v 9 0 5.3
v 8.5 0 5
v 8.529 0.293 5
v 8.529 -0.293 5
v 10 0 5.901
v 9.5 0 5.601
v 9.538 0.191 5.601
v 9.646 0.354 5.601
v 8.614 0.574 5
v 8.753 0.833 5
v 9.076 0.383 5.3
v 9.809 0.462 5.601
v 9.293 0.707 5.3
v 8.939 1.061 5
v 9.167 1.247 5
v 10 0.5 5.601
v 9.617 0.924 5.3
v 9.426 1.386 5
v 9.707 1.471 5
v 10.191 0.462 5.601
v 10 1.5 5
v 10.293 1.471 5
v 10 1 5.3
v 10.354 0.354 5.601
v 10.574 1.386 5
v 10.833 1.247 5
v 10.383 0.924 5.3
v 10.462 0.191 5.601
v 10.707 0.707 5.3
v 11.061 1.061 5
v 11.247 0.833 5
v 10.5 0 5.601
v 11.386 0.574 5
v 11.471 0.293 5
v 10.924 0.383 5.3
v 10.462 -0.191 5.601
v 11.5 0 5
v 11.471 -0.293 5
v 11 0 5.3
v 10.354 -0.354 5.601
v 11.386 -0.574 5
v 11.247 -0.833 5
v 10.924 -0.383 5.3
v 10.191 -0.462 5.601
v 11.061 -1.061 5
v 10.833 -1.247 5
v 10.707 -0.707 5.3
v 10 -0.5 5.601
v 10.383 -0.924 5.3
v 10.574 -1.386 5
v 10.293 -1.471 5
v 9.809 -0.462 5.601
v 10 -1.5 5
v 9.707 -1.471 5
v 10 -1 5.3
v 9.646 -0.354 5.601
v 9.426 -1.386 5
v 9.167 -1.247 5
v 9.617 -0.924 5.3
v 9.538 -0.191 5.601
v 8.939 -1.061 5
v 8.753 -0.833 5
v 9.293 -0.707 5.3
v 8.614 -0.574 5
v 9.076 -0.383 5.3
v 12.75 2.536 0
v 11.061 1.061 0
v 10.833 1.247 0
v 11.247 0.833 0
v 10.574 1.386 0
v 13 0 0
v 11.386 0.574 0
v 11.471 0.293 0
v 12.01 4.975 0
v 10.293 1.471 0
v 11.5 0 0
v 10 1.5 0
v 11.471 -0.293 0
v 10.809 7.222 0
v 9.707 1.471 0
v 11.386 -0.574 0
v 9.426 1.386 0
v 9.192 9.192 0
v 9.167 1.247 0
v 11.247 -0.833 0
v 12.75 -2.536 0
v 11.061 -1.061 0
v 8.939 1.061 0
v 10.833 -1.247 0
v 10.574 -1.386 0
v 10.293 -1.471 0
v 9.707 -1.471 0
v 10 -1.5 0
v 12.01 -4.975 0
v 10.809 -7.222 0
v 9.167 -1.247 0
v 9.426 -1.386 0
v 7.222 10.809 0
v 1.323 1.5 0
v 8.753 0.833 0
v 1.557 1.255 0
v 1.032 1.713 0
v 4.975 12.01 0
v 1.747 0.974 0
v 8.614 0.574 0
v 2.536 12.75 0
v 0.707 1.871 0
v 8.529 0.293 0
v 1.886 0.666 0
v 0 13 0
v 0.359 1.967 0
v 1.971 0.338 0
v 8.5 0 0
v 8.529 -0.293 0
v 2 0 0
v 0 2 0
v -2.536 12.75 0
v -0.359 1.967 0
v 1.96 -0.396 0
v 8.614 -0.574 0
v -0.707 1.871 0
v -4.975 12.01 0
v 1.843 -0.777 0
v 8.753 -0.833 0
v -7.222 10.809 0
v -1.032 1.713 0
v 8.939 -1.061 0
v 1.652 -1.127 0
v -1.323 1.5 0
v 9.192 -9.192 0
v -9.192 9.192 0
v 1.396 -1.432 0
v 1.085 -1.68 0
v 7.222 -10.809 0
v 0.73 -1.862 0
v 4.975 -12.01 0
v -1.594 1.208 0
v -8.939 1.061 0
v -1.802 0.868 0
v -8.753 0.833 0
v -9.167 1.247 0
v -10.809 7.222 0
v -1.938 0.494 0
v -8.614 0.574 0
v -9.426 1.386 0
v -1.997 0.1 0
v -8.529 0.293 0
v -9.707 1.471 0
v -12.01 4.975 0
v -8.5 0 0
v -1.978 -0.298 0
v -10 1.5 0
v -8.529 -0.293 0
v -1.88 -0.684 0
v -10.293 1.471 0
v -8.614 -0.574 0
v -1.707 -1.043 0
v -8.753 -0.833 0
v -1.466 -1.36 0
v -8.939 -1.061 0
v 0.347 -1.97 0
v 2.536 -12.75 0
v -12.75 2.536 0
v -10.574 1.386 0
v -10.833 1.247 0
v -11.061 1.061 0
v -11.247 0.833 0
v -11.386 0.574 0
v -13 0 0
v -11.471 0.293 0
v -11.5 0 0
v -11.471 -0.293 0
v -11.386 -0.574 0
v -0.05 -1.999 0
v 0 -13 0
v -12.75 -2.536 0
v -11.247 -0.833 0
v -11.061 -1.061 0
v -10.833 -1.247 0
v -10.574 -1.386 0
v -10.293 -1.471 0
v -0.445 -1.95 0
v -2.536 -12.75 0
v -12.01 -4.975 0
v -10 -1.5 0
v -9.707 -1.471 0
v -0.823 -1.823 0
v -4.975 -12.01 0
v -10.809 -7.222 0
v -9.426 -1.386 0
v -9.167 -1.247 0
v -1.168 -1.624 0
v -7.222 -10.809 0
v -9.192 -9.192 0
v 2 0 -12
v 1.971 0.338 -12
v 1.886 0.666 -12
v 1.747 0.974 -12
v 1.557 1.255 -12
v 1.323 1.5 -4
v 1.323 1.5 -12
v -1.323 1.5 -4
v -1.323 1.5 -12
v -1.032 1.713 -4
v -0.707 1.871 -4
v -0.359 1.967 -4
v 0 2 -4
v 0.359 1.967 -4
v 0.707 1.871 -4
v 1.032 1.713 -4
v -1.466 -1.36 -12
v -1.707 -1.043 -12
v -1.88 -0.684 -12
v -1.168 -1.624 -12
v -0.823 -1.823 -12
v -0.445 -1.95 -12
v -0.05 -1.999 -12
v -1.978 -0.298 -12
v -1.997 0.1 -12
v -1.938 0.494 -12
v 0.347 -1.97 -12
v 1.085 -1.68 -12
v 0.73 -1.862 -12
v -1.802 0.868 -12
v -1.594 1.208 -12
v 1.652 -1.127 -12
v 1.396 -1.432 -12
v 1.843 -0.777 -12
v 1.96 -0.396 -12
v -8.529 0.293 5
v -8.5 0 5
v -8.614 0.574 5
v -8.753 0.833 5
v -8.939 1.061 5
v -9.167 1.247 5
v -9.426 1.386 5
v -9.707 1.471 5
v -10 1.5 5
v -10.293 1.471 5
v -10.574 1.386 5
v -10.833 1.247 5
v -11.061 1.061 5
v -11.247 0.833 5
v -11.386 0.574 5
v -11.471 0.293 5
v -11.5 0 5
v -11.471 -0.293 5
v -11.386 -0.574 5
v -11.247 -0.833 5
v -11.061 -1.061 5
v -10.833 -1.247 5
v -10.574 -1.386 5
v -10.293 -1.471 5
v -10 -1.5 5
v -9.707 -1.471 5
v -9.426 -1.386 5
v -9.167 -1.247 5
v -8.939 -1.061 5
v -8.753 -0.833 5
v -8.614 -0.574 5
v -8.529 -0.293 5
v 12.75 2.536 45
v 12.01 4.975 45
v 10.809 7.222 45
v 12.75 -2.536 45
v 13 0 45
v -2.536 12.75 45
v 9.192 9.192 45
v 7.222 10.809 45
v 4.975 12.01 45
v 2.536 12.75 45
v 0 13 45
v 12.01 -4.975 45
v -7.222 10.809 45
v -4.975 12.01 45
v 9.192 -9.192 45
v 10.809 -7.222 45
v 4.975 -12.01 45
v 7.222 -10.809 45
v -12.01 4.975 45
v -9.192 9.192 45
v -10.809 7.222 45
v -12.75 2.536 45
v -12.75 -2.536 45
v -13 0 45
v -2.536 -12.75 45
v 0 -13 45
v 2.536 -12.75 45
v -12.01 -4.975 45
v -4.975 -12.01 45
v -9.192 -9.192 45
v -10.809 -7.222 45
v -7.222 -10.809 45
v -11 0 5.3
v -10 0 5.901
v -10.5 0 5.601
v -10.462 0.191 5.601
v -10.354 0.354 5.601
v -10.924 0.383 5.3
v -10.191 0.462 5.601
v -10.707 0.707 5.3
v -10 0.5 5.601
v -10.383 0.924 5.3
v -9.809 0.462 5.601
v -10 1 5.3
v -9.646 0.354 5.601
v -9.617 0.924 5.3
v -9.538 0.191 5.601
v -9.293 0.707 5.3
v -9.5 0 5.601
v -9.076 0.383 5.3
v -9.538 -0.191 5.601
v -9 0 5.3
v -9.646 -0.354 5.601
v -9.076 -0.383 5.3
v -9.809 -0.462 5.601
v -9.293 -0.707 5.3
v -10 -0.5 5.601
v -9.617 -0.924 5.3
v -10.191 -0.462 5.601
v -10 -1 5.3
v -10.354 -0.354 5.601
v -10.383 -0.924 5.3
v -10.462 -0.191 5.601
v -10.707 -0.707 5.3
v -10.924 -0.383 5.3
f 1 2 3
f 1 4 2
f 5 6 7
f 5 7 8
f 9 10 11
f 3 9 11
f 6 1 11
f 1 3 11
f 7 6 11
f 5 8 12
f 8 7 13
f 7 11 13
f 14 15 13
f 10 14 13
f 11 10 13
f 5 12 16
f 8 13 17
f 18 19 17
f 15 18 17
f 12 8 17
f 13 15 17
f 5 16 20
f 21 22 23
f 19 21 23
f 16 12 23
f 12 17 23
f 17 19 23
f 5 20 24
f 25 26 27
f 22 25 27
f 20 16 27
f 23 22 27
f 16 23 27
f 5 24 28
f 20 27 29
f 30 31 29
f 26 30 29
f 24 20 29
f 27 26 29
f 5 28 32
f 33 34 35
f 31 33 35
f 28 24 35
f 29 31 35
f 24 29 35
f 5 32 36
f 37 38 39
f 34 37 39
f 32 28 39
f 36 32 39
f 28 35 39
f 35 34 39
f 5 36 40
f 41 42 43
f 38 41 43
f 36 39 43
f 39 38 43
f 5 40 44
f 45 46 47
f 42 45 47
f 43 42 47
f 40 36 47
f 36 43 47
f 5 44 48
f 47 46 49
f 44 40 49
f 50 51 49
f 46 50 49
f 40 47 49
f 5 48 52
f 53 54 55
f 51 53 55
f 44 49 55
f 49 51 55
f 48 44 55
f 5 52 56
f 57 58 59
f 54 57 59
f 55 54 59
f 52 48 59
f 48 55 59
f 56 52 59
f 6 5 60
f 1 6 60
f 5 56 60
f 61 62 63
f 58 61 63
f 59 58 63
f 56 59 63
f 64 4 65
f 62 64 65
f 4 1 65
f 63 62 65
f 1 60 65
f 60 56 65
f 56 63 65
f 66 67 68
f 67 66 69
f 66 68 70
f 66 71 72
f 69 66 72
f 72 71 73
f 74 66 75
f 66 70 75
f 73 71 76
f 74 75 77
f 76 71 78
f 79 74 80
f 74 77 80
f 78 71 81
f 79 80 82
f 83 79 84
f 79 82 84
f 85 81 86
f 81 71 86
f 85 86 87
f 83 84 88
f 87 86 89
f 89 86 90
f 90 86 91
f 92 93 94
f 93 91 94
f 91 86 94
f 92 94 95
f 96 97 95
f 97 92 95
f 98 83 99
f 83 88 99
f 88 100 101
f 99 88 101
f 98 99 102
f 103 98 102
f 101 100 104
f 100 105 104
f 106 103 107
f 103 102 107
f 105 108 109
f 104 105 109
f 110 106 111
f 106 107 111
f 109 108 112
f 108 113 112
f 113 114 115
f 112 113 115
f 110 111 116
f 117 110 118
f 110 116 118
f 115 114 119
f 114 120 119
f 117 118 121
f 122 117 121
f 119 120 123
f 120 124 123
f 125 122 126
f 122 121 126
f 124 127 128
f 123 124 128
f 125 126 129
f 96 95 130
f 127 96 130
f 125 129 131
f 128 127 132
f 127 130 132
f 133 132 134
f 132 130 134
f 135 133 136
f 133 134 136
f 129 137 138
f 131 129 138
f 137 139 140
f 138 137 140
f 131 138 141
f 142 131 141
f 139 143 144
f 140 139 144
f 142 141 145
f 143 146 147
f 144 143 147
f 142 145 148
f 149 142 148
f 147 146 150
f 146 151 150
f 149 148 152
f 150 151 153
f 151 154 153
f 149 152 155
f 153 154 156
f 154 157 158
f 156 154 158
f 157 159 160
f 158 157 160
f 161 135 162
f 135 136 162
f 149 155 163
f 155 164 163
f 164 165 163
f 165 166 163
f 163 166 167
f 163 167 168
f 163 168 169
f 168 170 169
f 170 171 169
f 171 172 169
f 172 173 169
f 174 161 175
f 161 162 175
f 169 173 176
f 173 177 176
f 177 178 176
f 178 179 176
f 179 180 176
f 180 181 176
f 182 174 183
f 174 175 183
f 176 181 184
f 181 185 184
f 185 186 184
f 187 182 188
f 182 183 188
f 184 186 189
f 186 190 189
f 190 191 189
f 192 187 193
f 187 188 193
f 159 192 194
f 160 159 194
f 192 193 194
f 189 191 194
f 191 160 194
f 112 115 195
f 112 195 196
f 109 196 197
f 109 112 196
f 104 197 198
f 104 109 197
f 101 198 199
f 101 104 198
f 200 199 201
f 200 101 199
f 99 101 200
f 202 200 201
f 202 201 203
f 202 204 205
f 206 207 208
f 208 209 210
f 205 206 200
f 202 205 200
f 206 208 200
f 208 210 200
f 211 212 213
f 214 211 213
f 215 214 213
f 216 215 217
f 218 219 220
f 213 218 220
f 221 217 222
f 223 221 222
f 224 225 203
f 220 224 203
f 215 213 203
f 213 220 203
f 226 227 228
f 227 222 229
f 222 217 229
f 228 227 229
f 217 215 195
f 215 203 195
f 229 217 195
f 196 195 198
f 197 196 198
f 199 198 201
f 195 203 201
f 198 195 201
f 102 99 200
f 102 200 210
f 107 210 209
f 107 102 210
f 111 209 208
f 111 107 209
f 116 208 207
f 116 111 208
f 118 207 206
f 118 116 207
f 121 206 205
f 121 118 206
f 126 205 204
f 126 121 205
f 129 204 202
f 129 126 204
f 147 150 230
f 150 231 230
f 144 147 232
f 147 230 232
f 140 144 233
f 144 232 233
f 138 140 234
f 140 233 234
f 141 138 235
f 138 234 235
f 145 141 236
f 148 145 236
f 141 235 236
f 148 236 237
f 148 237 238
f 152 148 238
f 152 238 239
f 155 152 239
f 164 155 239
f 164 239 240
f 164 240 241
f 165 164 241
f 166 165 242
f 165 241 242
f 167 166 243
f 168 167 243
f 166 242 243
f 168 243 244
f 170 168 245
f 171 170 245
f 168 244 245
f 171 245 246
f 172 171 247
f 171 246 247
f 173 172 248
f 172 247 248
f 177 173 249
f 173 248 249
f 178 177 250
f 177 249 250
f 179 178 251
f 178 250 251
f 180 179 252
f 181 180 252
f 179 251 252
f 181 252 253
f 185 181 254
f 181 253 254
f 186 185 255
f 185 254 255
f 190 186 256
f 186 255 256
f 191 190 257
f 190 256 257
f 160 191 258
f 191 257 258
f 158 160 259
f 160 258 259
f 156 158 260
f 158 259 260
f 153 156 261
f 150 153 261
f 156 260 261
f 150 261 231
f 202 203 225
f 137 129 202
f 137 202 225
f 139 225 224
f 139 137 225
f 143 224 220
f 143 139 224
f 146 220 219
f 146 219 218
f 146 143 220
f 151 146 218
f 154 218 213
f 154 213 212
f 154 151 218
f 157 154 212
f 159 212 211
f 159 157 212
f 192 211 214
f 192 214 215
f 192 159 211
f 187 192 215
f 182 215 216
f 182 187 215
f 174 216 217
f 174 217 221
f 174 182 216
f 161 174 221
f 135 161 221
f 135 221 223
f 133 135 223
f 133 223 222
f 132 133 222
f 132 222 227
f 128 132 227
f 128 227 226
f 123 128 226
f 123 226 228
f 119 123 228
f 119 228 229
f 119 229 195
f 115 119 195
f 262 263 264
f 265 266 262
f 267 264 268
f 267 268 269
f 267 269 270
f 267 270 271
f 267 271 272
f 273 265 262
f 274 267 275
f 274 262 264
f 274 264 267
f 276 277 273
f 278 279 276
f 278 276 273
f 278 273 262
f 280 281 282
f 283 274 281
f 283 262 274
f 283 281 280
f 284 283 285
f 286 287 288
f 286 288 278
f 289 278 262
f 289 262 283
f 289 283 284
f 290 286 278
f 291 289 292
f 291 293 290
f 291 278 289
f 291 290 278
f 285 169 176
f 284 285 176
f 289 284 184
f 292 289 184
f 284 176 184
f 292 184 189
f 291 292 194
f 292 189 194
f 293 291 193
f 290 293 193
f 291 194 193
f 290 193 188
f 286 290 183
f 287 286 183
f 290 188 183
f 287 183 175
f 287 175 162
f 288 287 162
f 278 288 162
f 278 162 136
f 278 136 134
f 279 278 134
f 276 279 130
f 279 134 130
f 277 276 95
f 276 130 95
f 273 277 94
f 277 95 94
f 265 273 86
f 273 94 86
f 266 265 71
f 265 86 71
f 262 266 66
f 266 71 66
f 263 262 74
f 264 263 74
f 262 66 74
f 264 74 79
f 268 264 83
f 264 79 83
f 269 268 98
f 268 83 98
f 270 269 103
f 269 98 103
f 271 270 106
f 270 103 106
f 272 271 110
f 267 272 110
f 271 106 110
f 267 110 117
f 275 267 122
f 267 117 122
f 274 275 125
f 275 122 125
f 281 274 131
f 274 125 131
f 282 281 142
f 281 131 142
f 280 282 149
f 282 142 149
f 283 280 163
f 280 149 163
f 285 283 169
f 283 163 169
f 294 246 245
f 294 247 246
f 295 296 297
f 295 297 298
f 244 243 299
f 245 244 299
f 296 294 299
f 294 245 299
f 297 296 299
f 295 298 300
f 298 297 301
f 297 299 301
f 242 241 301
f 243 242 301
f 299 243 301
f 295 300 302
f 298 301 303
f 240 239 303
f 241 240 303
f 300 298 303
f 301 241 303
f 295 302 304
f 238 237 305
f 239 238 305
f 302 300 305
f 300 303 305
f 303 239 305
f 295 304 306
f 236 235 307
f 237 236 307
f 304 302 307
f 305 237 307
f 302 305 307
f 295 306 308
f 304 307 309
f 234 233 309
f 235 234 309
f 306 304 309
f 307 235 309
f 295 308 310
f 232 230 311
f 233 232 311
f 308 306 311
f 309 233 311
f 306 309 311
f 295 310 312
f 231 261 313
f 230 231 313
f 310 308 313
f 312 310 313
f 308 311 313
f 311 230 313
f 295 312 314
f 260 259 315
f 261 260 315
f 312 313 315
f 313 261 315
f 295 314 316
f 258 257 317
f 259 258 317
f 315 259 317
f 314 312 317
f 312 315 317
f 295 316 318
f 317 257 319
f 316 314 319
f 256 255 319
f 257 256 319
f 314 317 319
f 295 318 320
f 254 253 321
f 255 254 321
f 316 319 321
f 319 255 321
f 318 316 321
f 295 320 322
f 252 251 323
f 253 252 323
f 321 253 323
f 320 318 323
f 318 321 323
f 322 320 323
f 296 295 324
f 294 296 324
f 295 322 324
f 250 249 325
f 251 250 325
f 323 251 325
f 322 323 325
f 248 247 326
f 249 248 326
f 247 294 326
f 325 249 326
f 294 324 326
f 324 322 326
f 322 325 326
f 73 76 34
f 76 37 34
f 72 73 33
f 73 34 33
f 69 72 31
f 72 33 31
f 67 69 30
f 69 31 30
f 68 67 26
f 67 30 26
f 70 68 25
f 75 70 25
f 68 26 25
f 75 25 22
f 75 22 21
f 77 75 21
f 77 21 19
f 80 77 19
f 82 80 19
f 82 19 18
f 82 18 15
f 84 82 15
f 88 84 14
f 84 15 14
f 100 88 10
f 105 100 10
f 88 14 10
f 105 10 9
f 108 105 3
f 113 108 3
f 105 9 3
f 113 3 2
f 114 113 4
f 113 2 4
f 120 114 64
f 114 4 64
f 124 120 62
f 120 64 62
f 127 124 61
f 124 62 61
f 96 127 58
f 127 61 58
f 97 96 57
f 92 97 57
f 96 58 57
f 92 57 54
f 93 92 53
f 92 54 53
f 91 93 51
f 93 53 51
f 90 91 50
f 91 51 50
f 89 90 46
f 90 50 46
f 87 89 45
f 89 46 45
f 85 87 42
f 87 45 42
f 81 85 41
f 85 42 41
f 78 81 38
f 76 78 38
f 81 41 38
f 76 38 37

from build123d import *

# Parameters (mm, degrees)
SKETCH1_R                 = 13
MOTOR_BODY_DEPTH          = 45
BOSS_EXTRUDE2_DEPTH       = 12
BOSS_EXTRUDE3_DEPTH       = 4
F_3_0MM_DOWEL_HOLE2_D     = 3
F_3_0MM_DOWEL_HOLE2_DEPTH = 5
F_3_0MM_DOWEL_HOLE2_TIP   = 0.901290929


with BuildPart() as part:
    # Sketch1 → Motor Body (new body)
    with BuildSketch(Plane.XY):
        with Locations(Location((0, 0, 0), (0, 0, 180))):
            Circle(SKETCH1_R)
    extrude(amount=MOTOR_BODY_DEPTH)

    # Sketch2 → Boss-Extrude2 (add)
    with BuildSketch(Plane.XY):
        with BuildLine():
            ThreePointArc((2, 0), (1.822875656, 0.822875656), (1.322875656, 1.5))
            Line((1.322875656, 1.5), (-1.322875656, 1.5))
            ThreePointArc((-1.322875656, 1.5), (-0.822875656, -1.822875656), (2, 0))
        make_face()
    extrude(amount=-BOSS_EXTRUDE2_DEPTH)

    # Sketch2<3> → Boss-Extrude3 (add)
    with BuildSketch(Plane.XY):
        with BuildLine():
            ThreePointArc((2, 0), (1.822875656, 0.822875656), (1.322875656, 1.5))
            Line((1.322875656, 1.5), (-1.322875656, 1.5))
            ThreePointArc((-1.322875656, 1.5), (-0.822875656, -1.822875656), (2, 0))
        make_face()
        with BuildLine():
            Line((-1.322875656, 1.5), (1.322875656, 1.5))
            ThreePointArc((1.322875656, 1.5), (0, 2), (-1.322875656, 1.5))
        make_face()
    extrude(amount=-BOSS_EXTRUDE3_DEPTH)

    # Ø3.0mm Dowel Hole2
    with Locations(Plane(origin=(0, 0, 0), x_dir=(-1, 0, 0), z_dir=(0, 0, -1))):
        with Locations((-10, 0), (10, 0)):
            Hole(F_3_0MM_DOWEL_HOLE2_D / 2, depth=F_3_0MM_DOWEL_HOLE2_DEPTH)
            with Locations((0, 0, -(F_3_0MM_DOWEL_HOLE2_DEPTH + F_3_0MM_DOWEL_HOLE2_TIP / 2))):  # 118° drill point
                Cone(0, F_3_0MM_DOWEL_HOLE2_D / 2, F_3_0MM_DOWEL_HOLE2_TIP, mode=Mode.SUBTRACT)


solid = part.part
